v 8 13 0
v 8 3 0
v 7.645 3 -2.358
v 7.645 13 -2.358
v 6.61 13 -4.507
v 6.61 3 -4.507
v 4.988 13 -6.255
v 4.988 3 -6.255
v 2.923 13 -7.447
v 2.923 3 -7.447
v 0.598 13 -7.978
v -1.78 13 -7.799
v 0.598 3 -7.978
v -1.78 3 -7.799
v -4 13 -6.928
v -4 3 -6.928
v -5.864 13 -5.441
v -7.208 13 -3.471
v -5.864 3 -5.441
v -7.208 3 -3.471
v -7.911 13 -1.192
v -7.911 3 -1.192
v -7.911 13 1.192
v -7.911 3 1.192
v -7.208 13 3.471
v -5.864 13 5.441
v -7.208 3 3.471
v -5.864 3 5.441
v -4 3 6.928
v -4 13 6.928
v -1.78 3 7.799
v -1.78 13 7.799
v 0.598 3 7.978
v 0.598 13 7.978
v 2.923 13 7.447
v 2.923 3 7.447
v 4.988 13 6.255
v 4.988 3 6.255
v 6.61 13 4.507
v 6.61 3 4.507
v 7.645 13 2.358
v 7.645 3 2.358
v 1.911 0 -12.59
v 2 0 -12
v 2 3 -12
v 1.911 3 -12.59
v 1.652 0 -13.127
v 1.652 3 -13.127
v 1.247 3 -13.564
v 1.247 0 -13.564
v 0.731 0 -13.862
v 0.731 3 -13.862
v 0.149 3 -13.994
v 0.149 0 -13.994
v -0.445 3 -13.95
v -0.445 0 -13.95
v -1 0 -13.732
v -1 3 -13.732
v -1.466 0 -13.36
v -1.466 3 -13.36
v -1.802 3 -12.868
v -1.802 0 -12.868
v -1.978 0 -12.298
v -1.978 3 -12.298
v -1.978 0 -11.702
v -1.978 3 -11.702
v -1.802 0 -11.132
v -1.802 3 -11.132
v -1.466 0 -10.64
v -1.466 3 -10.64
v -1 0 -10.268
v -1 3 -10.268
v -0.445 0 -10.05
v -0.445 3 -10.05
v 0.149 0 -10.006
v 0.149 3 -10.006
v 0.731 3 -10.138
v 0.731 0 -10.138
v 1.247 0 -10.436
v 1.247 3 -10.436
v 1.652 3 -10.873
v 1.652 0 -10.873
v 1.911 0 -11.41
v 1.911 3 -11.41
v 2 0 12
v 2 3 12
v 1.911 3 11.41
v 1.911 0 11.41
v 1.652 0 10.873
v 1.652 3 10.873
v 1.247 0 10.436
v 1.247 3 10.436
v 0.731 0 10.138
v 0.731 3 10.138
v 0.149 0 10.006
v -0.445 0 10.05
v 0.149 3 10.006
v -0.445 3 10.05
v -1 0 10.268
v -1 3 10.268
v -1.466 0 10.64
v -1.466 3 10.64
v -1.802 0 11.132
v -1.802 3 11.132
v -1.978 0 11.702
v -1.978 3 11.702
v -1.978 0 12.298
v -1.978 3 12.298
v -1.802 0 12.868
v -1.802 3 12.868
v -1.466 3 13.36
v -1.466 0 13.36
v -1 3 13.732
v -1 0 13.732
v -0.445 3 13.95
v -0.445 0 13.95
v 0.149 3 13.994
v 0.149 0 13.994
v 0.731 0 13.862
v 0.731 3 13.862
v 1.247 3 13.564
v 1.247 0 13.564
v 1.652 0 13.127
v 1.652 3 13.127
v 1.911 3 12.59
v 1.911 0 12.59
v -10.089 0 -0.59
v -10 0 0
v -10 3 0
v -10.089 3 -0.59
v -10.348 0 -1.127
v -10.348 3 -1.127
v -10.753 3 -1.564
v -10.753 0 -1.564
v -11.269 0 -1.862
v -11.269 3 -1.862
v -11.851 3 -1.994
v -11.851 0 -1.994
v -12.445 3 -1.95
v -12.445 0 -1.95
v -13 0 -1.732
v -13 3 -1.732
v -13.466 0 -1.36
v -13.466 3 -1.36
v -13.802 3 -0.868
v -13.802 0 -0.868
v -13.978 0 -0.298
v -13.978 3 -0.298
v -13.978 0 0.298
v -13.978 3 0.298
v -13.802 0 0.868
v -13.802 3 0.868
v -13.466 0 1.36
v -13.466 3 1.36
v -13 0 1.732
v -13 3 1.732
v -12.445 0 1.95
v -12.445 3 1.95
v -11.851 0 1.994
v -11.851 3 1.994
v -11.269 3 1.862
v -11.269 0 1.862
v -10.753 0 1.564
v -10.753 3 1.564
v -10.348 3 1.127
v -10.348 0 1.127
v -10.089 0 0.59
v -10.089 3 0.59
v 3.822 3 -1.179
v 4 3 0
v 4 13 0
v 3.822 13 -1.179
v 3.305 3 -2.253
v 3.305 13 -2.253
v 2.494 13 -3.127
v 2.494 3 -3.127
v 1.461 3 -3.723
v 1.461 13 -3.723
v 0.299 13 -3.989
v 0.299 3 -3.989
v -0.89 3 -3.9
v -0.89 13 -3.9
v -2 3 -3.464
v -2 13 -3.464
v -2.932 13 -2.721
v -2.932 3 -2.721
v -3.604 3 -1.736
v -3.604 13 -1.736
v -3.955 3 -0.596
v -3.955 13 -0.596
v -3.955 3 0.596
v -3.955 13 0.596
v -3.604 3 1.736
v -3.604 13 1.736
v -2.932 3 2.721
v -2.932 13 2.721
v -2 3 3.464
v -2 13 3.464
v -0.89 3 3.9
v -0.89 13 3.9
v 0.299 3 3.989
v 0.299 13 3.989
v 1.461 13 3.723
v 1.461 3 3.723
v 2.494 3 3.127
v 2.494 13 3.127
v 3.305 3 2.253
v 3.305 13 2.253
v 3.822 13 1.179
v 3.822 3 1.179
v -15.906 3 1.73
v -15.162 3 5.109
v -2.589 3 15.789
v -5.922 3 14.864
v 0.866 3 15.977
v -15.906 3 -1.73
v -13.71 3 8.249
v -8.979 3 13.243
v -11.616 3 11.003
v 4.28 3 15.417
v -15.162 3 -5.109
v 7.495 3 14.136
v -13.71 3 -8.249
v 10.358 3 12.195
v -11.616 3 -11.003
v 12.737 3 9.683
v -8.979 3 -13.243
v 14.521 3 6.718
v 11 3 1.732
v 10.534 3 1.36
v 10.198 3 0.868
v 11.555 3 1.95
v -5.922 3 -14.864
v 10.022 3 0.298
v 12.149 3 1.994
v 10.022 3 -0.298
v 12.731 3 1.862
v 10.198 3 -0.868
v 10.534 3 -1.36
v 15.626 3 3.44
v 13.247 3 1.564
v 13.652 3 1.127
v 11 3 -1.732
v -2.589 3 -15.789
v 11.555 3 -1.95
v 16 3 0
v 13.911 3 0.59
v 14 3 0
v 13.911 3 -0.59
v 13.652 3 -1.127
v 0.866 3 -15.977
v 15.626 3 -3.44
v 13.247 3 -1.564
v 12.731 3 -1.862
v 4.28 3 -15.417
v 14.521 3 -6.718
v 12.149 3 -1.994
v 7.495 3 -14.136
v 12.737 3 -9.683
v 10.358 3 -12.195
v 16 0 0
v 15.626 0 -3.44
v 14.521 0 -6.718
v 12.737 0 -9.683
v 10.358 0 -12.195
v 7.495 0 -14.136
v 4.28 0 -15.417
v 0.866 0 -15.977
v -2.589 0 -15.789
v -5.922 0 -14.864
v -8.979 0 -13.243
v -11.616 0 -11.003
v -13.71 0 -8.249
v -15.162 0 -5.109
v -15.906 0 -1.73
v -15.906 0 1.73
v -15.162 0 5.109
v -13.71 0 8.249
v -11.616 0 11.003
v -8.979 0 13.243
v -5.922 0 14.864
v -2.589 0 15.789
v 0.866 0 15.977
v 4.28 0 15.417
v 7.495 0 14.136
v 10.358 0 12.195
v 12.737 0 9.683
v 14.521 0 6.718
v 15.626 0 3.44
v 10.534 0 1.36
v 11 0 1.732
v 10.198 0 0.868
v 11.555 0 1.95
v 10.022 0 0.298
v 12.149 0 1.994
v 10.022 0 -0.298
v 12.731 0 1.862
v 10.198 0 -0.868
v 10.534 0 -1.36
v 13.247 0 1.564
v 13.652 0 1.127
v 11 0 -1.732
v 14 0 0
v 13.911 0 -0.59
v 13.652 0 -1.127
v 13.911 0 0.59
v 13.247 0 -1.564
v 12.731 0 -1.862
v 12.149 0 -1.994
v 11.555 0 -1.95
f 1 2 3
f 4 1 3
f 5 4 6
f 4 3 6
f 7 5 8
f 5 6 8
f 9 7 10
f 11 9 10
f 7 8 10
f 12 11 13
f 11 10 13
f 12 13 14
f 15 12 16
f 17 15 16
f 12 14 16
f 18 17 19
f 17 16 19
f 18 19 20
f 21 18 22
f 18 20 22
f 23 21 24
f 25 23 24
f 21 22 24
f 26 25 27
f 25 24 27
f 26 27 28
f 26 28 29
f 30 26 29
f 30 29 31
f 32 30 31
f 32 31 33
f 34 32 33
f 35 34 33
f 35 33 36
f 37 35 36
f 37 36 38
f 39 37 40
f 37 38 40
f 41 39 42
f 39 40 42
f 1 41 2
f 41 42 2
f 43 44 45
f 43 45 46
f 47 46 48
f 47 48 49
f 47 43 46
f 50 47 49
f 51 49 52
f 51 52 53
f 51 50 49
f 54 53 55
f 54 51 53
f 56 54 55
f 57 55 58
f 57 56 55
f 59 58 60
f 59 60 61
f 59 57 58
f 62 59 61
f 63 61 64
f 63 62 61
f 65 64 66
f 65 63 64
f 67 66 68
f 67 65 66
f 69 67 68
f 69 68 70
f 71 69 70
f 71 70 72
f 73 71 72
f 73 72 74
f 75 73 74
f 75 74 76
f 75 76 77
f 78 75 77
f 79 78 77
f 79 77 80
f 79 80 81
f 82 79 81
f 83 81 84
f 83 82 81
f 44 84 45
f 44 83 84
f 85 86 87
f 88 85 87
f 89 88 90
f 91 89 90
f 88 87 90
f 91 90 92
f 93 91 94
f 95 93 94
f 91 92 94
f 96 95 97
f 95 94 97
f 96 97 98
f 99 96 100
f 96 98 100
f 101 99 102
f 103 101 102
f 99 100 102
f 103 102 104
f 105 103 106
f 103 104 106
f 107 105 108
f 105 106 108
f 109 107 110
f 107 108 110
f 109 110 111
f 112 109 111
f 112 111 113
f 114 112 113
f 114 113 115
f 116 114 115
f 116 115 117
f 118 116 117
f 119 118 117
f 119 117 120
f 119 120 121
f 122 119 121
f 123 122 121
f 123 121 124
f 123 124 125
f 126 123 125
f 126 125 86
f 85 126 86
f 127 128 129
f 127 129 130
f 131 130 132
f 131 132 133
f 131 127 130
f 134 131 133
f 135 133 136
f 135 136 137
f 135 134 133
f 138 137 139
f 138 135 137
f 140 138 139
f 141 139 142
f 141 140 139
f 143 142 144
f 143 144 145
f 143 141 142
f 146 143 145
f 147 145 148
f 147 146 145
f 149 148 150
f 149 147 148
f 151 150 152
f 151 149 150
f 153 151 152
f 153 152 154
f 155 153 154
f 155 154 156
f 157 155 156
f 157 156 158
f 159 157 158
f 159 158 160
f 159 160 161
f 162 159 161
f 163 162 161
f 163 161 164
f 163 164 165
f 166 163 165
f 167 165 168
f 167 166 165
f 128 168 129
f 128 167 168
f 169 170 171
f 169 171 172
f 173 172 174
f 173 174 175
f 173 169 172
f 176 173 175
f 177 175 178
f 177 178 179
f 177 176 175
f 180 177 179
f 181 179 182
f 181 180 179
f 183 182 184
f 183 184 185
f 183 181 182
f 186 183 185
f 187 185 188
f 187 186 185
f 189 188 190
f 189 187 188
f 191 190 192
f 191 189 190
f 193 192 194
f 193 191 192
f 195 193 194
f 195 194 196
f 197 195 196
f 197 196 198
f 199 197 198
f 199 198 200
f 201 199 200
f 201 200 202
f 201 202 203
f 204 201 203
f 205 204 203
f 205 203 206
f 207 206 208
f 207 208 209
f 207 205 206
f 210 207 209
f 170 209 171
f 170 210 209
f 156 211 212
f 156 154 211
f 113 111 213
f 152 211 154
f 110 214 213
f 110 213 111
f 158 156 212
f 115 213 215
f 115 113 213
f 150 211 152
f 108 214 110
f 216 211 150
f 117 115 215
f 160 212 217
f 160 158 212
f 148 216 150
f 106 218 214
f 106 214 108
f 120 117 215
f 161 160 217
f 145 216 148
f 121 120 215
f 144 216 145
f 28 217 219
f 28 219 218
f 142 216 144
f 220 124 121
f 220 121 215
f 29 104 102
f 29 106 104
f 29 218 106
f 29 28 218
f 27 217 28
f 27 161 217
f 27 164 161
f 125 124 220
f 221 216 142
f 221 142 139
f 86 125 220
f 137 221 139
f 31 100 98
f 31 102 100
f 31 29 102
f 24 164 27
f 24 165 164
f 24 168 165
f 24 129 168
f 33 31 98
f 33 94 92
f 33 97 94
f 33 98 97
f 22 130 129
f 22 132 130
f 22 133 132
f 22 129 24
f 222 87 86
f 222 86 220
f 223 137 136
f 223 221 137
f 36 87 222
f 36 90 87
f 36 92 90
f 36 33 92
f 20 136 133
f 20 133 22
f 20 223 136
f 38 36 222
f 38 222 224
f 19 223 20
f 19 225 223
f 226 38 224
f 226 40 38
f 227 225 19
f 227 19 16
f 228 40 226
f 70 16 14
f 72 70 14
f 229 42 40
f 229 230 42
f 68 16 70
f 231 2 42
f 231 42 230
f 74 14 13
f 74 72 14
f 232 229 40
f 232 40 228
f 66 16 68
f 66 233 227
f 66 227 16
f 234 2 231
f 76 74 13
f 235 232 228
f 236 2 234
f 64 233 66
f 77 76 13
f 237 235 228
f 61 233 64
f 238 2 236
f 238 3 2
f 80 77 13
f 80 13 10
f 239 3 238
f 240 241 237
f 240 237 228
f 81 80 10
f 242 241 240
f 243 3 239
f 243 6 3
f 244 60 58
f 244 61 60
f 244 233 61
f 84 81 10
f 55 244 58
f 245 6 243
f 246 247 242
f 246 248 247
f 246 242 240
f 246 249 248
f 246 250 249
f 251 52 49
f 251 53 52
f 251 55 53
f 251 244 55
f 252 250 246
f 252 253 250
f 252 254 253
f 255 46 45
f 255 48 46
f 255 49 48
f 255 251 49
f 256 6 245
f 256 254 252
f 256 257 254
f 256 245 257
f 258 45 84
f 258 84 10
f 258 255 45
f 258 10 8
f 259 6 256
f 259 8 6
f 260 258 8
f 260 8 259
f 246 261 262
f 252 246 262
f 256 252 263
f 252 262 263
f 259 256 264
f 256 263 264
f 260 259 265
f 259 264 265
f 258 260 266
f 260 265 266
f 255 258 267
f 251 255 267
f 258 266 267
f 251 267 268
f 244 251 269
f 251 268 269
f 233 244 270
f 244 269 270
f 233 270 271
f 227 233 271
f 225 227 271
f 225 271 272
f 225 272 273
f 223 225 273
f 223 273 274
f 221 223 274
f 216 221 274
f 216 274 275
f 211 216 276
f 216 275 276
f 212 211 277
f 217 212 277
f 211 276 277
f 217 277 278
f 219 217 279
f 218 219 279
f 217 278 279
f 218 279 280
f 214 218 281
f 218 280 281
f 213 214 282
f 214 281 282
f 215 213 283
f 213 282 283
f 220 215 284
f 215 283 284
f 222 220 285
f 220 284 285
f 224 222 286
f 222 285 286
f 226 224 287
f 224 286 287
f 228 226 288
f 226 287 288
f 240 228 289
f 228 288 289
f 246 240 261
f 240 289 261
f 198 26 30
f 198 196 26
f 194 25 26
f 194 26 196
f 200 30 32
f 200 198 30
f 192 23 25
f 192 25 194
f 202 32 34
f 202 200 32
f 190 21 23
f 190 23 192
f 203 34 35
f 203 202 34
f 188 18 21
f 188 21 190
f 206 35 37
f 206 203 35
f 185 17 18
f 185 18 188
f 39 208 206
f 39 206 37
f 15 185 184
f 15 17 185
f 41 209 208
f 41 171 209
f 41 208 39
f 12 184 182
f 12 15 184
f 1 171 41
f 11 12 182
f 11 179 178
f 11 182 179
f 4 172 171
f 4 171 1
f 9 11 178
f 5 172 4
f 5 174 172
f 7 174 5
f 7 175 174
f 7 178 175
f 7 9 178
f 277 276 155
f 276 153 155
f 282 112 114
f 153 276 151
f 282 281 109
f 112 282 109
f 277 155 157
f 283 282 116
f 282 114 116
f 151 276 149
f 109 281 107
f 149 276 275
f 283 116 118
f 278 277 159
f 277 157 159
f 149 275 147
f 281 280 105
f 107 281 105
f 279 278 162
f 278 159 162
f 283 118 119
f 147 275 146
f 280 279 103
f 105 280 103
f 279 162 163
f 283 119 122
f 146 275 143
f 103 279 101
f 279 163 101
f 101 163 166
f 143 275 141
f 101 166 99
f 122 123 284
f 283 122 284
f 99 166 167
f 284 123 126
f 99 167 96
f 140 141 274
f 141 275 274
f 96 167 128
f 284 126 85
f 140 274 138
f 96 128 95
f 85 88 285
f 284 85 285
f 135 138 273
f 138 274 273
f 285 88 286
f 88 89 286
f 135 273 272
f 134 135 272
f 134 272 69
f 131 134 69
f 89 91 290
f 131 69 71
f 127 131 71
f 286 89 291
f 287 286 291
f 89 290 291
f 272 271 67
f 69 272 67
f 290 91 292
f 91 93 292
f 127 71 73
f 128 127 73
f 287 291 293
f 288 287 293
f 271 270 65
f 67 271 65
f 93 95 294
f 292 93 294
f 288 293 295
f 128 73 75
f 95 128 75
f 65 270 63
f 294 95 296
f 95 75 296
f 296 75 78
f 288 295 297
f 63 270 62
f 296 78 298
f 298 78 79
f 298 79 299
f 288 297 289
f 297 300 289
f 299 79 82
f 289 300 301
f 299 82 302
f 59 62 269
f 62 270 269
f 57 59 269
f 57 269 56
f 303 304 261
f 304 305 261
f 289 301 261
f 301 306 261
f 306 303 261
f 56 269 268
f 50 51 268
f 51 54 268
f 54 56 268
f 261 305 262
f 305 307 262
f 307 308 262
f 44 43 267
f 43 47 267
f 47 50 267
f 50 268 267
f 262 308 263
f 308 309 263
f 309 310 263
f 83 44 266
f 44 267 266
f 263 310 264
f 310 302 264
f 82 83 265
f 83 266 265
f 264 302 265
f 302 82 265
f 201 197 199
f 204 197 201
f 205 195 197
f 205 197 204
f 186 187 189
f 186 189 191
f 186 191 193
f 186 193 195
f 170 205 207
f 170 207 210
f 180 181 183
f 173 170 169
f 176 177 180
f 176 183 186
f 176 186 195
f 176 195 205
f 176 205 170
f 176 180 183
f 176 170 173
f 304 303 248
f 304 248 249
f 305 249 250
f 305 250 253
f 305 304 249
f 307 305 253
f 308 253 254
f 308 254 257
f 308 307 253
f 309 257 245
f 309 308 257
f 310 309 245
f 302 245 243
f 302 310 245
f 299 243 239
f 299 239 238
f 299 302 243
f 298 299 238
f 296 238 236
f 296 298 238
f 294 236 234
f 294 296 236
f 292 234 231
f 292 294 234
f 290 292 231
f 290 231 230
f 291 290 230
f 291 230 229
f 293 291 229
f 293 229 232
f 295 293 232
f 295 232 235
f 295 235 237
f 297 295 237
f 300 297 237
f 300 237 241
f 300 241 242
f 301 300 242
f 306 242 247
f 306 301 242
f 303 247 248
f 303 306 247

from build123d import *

# Parameters (mm, degrees)
SKETCH2_R           = 16
SKETCH2_R_2         = 2
BOSS_EXTRUDE1_DEPTH = 3
SKETCH3_R           = 8
SKETCH3_R_2         = 4
BOSS_EXTRUDE2_DEPTH = 10
SKETCH4_R           = 2
CUT_EXTRUDE1_DEPTH  = 59


with BuildPart() as part:
    # Sketch2 → Boss-Extrude1 (new body)
    with BuildSketch(Plane(origin=(0, 0, 0), x_dir=(1, 0, 0), z_dir=(0, 1, 0))):
        Circle(SKETCH2_R)
        with Locations((0, 12)):
            Circle(SKETCH2_R_2, mode=Mode.SUBTRACT)
        with Locations((-12, 0)):
            Circle(SKETCH2_R_2, mode=Mode.SUBTRACT)
        with Locations((12, 0)):
            Circle(SKETCH2_R_2, mode=Mode.SUBTRACT)
    extrude(amount=BOSS_EXTRUDE1_DEPTH)

    # Sketch3 → Boss-Extrude2 (add)
    with BuildSketch(Plane(origin=(0, 3, 0), x_dir=(1, 0, 0), z_dir=(0, 1, 0))):
        Circle(SKETCH3_R)
        Circle(SKETCH3_R_2, mode=Mode.SUBTRACT)
    extrude(amount=BOSS_EXTRUDE2_DEPTH)

    # Sketch4 → Cut-Extrude1 (cut)
    with BuildSketch(Plane(origin=(0, 3, 0), x_dir=(1, 0, 0), z_dir=(0, 1, 0))):
        with Locations((0, -12)):
            Circle(SKETCH4_R)
    extrude(amount=-CUT_EXTRUDE1_DEPTH, mode=Mode.SUBTRACT)


solid = part.part
